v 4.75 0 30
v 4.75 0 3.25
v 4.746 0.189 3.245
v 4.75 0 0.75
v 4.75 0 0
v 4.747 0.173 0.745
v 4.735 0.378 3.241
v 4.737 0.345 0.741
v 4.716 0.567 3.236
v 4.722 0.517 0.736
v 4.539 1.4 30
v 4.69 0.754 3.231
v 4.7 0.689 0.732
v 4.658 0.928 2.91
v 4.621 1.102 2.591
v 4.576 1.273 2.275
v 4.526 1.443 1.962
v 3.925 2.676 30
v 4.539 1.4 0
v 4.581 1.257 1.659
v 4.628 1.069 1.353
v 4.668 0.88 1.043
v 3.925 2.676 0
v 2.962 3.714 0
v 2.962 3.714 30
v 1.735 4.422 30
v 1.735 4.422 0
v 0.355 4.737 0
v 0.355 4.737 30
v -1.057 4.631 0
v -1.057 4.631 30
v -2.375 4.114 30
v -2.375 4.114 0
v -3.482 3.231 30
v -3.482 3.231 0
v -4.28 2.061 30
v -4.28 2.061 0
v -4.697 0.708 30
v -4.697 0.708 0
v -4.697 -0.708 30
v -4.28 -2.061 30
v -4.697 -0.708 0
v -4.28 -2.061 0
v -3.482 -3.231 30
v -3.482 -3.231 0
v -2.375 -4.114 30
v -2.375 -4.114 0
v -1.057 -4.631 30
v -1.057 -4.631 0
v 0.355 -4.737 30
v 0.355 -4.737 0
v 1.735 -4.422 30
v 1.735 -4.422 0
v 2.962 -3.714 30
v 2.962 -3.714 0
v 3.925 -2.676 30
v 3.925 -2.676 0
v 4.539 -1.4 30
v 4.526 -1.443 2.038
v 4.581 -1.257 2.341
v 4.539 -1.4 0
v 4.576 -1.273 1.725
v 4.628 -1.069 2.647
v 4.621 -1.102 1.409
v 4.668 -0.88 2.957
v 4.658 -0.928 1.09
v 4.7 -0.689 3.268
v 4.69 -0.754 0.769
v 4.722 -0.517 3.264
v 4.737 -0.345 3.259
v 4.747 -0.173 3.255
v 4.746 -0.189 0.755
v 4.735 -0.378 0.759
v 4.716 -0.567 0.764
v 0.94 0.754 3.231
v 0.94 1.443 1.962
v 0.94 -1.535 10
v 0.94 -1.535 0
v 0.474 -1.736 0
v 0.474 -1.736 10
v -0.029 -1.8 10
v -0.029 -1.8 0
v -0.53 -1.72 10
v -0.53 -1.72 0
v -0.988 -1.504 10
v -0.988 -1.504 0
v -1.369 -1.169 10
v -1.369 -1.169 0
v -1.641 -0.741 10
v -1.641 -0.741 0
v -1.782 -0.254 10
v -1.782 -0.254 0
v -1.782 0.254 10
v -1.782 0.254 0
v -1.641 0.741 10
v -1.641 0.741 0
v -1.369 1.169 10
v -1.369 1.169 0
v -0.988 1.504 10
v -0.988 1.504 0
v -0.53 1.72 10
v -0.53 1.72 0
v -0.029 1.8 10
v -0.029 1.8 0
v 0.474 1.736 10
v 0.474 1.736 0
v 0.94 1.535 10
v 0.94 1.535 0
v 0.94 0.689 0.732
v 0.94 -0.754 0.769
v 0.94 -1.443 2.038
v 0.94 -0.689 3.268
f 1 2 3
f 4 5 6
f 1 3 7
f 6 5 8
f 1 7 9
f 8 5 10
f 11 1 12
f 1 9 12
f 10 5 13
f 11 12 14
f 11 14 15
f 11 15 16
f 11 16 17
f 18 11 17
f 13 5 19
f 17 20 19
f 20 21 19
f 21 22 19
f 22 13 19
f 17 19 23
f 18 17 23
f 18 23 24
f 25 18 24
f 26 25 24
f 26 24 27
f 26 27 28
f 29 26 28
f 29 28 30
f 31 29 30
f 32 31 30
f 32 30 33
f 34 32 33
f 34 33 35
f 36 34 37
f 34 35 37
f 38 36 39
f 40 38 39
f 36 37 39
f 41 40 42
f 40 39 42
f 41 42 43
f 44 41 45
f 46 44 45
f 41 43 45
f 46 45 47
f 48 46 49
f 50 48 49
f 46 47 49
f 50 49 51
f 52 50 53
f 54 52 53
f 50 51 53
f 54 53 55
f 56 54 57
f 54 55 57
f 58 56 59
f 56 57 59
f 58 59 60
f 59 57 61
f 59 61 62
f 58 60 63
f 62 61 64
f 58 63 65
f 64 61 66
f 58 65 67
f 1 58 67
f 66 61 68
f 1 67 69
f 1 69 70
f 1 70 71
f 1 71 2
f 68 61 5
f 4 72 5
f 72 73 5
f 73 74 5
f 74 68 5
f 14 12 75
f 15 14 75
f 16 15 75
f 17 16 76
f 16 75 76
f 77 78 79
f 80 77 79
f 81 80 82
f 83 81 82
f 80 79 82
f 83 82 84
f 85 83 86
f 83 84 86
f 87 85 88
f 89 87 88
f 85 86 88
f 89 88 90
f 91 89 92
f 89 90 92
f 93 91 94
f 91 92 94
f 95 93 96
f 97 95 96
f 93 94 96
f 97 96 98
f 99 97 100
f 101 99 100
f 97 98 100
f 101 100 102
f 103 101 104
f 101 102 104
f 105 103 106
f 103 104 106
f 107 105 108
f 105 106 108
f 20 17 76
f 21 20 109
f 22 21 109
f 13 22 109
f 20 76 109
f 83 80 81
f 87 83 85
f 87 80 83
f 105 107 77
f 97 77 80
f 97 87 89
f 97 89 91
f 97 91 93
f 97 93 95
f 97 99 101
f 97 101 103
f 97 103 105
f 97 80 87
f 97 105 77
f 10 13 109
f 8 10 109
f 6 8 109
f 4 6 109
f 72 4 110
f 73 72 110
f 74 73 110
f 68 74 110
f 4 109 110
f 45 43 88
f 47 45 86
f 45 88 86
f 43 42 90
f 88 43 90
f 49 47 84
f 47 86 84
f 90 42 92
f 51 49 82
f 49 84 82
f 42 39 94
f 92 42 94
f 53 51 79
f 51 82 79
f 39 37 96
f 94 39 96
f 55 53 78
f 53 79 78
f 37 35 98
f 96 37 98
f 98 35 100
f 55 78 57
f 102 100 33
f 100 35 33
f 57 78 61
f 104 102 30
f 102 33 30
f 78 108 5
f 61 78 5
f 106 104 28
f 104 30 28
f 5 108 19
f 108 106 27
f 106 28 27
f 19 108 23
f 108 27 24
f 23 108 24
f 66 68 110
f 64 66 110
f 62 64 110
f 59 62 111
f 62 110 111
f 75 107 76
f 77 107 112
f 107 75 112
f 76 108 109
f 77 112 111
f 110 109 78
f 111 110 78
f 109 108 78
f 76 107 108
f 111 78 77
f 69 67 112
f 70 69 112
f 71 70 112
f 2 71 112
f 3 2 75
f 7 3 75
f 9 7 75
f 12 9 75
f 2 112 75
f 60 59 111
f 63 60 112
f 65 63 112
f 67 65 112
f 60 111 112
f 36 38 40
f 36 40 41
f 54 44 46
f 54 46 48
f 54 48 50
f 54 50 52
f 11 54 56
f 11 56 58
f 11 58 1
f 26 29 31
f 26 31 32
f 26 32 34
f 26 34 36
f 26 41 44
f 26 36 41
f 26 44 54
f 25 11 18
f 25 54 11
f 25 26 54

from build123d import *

# Parameters (mm, degrees)
SKETCH1_R           = 4.75
BOSS_EXTRUDE1_DEPTH = 30
CUT_EXTRUDE1_DEPTH  = 10
CUT_EXTRUDE2_DEPTH  = 31.902080836


with BuildPart() as part:
    # Sketch1 → Boss-Extrude1 (new body)
    with BuildSketch(Plane.XY):
        Circle(SKETCH1_R)
    extrude(amount=BOSS_EXTRUDE1_DEPTH)

    # Sketch2 → Cut-Extrude1 (cut)
    with BuildSketch(Plane(origin=(0, 0, 0), x_dir=(-1, 0, 0), z_dir=(0, 0, -1))):
        with BuildLine():
            Line((-0.94, 1.535057002), (-0.94, -1.535057002))
            ThreePointArc((-0.94, -1.535057002), (1.8, 0), (-0.94, 1.535057002))
        make_face()
    extrude(amount=-CUT_EXTRUDE1_DEPTH, mode=Mode.SUBTRACT)

    # Sketch3 → Cut-Extrude2 (cut, through all)
    with BuildSketch(Plane.ZY.offset(-0.94)):
        Polygon((3.230708553, 0.754115238), (1.962271323, 1.44288249), (0.73156277, 0.688767252), (0.769291447, -0.754115238), (2.037728677, -1.44288249), (3.26843723, -0.688767252), align=None)
    extrude(amount=-CUT_EXTRUDE2_DEPTH, mode=Mode.SUBTRACT)


solid = part.part
